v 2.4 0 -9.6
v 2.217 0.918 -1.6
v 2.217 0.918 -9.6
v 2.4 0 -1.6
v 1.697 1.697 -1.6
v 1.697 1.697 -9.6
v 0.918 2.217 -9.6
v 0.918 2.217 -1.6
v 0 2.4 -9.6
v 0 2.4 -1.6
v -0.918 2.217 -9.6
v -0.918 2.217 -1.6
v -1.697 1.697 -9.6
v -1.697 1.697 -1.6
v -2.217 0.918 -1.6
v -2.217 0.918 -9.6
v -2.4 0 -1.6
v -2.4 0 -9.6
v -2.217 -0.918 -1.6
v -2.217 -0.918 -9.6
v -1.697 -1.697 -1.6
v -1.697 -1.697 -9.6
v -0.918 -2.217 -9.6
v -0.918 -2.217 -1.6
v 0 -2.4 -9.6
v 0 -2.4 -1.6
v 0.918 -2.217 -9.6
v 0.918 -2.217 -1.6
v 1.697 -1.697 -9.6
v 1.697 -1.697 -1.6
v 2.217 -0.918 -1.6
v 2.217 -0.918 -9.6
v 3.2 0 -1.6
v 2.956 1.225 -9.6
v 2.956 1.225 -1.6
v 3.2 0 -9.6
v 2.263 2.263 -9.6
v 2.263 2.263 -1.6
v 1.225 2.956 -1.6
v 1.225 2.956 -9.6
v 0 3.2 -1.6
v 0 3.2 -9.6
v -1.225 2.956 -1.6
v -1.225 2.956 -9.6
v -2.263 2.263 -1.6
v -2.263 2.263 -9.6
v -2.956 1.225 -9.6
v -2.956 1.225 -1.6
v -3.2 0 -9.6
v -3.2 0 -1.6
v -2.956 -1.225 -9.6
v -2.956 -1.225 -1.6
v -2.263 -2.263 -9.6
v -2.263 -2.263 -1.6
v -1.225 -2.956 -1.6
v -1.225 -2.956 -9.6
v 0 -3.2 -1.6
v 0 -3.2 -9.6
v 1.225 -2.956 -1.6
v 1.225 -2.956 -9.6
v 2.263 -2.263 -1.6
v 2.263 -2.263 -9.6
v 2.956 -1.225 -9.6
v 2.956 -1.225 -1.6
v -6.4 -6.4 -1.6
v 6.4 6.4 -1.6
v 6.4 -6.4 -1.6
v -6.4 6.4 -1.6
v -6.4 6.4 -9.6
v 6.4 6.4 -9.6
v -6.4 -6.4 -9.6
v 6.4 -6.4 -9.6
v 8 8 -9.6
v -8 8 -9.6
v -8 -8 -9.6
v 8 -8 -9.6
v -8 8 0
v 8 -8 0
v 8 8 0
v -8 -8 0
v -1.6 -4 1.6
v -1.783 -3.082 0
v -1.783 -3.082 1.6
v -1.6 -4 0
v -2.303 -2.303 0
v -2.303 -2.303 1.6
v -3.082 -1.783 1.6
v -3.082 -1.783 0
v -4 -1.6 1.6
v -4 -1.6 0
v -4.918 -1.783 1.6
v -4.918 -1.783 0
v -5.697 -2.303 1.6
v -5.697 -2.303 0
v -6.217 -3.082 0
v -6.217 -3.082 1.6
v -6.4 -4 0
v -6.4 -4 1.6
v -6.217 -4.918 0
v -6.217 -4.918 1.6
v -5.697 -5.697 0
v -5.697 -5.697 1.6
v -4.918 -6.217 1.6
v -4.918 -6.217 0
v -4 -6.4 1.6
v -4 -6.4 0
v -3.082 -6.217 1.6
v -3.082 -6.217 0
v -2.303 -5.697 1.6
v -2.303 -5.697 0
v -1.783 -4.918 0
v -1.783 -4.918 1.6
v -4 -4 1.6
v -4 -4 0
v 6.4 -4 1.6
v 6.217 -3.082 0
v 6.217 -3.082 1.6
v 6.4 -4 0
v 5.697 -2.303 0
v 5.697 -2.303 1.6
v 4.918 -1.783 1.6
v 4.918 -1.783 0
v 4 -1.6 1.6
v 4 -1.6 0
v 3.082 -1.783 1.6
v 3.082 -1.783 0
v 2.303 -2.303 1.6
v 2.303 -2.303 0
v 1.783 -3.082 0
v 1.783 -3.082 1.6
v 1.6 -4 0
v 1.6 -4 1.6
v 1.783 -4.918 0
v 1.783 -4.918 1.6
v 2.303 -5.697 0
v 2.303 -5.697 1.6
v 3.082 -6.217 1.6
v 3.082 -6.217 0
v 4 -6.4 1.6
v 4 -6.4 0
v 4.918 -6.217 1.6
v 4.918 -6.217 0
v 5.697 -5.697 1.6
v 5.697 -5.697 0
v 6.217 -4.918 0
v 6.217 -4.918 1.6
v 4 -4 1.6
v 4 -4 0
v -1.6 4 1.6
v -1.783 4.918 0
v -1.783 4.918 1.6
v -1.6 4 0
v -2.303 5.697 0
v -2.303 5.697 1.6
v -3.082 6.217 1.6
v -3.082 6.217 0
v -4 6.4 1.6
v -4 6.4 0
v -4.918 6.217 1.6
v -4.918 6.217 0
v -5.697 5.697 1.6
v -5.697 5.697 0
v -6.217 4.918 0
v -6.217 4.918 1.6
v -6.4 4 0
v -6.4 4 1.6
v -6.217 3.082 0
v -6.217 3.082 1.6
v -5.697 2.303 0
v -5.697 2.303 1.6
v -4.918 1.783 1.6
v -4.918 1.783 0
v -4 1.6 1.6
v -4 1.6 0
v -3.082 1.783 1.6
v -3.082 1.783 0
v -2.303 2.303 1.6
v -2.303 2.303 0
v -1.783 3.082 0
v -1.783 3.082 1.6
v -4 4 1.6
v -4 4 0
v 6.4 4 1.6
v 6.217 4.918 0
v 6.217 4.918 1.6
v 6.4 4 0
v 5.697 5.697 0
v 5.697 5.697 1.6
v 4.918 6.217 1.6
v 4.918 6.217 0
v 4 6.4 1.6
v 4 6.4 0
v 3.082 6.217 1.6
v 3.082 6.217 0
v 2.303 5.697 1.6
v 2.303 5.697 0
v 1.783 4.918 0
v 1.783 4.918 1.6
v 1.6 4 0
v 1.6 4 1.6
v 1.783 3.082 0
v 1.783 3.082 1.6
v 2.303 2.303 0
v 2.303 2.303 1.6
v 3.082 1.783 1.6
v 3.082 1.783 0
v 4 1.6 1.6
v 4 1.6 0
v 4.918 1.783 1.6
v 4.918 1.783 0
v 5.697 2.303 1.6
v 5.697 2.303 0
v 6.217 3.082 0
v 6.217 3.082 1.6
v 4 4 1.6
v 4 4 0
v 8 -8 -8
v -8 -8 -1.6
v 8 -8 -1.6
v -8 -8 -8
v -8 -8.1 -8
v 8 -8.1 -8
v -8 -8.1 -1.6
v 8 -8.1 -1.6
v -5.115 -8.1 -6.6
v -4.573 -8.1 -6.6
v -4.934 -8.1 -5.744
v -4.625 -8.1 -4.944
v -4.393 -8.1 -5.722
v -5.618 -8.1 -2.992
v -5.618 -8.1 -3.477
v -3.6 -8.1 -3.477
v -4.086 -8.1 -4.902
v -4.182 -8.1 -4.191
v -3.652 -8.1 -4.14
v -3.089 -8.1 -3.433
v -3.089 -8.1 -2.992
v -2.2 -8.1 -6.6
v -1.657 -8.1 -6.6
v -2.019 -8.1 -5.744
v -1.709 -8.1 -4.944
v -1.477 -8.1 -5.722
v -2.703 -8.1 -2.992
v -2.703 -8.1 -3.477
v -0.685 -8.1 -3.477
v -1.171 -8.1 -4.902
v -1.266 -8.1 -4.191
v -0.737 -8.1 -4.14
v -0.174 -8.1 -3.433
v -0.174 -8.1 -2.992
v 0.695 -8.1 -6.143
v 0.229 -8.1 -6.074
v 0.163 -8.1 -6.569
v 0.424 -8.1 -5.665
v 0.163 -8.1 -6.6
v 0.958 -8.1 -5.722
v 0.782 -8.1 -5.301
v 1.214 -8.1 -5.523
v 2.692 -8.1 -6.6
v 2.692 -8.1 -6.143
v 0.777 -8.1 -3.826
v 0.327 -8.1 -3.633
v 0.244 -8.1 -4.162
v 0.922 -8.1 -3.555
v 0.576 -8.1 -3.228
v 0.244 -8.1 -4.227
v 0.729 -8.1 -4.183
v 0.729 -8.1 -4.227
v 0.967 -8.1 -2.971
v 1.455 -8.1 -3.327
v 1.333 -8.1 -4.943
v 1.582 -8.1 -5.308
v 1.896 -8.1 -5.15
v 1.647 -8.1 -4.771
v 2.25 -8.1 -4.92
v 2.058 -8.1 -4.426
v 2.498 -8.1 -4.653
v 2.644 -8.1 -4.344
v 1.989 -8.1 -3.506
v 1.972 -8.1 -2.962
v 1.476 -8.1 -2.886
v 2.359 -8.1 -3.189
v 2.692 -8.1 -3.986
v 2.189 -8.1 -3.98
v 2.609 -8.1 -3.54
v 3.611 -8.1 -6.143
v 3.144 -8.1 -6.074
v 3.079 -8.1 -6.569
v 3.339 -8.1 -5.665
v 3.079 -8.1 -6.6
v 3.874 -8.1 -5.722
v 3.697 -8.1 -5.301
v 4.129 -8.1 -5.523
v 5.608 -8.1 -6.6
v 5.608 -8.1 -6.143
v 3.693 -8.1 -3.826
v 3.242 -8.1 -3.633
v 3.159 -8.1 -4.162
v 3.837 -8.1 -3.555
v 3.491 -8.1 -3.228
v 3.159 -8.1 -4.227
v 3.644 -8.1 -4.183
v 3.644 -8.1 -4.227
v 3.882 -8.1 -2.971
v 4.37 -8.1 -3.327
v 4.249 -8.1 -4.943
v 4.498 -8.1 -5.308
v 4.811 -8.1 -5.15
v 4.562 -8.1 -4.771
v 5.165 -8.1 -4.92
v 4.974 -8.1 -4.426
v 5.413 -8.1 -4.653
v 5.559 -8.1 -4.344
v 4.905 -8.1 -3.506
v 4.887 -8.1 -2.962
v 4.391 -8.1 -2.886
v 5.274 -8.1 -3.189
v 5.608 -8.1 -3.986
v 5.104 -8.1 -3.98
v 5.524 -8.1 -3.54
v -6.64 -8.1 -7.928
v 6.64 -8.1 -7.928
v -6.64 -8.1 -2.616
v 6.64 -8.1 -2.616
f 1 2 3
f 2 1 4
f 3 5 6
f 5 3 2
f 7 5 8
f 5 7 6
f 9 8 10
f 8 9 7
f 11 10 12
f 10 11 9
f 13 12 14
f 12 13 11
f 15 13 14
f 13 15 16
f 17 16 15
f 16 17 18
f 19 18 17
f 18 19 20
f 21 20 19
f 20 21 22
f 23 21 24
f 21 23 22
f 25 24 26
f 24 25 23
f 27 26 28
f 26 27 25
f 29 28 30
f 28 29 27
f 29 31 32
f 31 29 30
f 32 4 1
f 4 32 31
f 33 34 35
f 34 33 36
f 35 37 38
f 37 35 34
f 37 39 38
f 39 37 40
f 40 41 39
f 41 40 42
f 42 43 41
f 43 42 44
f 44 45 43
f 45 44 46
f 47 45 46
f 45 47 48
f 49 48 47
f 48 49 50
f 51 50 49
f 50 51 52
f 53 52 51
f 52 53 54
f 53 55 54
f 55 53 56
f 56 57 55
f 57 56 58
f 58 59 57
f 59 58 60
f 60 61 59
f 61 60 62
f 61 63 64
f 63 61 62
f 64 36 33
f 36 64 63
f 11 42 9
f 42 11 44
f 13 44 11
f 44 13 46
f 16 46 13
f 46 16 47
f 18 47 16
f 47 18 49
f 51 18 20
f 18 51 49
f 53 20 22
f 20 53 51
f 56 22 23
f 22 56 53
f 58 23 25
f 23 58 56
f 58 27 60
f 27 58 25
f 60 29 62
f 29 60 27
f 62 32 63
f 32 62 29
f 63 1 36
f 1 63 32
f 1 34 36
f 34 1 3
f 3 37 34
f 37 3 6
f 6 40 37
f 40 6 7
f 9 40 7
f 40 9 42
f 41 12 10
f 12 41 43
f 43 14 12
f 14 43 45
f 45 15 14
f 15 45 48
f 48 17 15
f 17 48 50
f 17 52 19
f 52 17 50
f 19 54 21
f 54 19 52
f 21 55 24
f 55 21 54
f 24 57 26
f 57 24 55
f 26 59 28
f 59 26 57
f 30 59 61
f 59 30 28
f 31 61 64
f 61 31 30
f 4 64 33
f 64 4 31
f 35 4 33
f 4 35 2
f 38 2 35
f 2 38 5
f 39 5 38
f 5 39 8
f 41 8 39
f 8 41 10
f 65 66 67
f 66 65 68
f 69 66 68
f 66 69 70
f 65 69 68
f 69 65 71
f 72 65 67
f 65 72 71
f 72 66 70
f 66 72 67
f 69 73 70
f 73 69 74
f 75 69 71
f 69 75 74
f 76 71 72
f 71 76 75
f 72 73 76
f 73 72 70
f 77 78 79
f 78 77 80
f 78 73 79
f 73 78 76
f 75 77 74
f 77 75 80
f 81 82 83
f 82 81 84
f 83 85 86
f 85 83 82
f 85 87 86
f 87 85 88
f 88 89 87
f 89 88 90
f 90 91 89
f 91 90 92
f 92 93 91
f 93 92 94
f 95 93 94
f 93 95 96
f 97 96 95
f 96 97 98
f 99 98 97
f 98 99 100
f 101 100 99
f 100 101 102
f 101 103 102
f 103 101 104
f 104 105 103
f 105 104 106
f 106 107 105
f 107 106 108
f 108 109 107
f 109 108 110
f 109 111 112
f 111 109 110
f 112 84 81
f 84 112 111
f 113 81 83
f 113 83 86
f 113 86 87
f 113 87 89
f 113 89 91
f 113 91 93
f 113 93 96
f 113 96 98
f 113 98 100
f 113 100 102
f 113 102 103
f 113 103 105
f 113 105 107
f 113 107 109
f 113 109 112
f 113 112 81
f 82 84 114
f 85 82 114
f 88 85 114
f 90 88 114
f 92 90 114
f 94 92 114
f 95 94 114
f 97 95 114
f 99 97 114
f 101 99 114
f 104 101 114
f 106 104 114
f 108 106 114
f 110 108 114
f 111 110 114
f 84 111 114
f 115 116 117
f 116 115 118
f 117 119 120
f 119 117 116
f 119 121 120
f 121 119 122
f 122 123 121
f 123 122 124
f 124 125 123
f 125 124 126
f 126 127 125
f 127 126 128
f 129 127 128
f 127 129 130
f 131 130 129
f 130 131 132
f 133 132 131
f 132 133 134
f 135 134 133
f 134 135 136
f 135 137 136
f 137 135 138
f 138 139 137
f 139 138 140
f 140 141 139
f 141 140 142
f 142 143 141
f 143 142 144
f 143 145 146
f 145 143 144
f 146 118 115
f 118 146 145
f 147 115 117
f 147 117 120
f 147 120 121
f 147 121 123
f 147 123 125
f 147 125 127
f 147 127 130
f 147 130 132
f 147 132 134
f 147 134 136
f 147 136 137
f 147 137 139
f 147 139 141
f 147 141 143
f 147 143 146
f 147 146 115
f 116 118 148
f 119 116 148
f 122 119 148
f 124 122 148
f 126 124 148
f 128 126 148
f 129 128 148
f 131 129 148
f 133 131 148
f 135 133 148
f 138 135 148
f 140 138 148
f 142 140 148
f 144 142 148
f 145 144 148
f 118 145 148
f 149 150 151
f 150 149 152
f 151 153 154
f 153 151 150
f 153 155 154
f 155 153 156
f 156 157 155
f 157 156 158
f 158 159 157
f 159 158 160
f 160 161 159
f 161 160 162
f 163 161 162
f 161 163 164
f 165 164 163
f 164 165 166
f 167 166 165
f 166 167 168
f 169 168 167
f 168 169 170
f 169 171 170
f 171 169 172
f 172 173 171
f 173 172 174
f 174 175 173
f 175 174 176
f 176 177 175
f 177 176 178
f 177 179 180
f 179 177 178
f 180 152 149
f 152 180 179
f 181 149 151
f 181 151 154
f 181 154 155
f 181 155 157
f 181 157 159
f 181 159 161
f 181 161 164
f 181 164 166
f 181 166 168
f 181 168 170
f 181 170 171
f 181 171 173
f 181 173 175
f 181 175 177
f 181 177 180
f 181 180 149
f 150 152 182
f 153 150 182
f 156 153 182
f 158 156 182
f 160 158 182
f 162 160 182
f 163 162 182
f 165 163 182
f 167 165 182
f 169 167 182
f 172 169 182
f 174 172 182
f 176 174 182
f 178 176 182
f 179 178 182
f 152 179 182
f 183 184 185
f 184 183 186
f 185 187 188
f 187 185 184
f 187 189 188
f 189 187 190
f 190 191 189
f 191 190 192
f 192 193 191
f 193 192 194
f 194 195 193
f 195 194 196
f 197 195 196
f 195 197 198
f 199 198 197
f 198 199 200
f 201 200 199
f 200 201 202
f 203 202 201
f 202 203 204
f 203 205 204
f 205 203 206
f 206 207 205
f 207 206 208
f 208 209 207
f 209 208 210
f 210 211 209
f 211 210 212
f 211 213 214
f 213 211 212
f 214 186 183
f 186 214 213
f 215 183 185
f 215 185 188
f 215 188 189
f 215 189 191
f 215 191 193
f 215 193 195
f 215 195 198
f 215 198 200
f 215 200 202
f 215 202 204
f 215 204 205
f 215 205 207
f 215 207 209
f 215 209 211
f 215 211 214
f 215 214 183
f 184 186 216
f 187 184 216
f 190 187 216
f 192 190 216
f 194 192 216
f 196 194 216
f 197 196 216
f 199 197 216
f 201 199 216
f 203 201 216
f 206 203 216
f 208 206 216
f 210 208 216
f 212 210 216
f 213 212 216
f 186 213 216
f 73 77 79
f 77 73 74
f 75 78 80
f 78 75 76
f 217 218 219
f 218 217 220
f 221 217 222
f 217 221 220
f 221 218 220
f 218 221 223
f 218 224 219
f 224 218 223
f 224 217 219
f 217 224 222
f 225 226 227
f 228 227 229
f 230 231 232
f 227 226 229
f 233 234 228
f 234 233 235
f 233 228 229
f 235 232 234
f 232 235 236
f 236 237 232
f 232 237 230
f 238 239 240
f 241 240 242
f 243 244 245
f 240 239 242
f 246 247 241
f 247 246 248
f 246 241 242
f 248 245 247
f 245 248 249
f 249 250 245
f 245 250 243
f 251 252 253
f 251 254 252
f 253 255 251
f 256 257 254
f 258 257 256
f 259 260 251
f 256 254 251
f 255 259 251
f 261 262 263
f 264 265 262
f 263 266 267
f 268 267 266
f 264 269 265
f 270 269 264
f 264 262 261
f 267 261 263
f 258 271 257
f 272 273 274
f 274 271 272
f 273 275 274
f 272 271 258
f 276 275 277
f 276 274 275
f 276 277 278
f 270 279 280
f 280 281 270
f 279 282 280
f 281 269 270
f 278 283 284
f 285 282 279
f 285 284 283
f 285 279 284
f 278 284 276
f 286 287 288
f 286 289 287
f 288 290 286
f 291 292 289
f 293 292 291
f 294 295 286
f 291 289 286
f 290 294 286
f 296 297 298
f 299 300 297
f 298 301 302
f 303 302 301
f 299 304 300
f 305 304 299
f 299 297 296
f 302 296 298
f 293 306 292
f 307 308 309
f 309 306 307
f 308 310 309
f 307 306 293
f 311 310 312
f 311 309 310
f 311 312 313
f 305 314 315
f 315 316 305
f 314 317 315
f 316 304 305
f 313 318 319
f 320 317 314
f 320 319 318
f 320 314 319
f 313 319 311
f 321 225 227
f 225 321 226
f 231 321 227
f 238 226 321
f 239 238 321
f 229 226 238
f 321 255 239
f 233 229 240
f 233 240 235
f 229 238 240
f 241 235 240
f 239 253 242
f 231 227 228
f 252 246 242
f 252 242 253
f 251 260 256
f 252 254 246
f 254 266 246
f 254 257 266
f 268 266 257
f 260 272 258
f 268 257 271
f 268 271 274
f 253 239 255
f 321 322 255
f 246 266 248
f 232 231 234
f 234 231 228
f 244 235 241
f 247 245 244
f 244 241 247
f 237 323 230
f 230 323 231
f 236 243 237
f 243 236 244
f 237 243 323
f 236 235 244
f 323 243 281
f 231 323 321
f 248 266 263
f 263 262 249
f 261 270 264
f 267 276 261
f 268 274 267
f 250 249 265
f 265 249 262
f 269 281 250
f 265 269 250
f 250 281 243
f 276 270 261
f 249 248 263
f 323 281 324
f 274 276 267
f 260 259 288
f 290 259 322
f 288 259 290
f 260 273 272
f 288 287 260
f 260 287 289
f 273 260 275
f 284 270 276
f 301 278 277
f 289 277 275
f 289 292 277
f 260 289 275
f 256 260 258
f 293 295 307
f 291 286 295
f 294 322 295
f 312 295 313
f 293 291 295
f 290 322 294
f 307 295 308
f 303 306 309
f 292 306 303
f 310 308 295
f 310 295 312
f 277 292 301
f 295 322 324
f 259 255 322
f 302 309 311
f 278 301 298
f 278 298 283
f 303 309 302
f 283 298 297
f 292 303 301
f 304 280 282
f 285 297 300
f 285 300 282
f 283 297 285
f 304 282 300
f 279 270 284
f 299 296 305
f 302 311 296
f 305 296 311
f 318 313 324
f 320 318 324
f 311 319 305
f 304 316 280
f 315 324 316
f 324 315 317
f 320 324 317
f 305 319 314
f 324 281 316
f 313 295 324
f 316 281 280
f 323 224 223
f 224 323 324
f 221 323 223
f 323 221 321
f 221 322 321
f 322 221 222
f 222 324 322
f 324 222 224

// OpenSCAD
use <../lib.scad>
use <196935b.scad>
use <3003.scad>
function ldraw_lib__3003d05() = [
// 0 Brick  2 x  2 with White "7722" Sticker
// 0 Name: 3003d05.dat
// 0 Author: Takeshi Takahashi [RainbowDolphin]
// 0 !LDRAW_ORG Shortcut UPDATE 2024-10
// 0 !LICENSE Licensed under CC BY 4.0 : see CAreadme.txt
// 
// 0 BFC CERTIFY CCW
  [0,"BFC","CERTIFY"],
  [0,"BFC","CCW"],
// 
// 0 !CATEGORY Sticker Shortcut
// 0 !KEYWORDS Bricklink 3003pb031, set 7722, Train
// 
// 0 !HISTORY 2024-12-01 [OrionP] Official Update 2024-10
// 
// 1 16 0 0 0 1 0 0 0 1 0 0 0 1 3003.dat
  [1,16,0,0,0,1,0,0,0,1,0,0,0,1, ldraw_lib__3003()],
// 1 16 0 12 -20 1 0 0 0 0 -1 0 1 0 196935b.dat
  [1,16,0,12,-20,1,0,0,0,0,-1,0,1,0, ldraw_lib__196935b()],
];
module ldraw_lib__3003d05(step=0, col=false, unit=2/5, alt=false, line=0.2, solid=!$preview)
    makepoly(ldraw_lib__3003d05(), step=step, col=col, unit=unit, alt=alt, line=line, solid=solid);
ldraw_lib__3003d05(line=0.2);
